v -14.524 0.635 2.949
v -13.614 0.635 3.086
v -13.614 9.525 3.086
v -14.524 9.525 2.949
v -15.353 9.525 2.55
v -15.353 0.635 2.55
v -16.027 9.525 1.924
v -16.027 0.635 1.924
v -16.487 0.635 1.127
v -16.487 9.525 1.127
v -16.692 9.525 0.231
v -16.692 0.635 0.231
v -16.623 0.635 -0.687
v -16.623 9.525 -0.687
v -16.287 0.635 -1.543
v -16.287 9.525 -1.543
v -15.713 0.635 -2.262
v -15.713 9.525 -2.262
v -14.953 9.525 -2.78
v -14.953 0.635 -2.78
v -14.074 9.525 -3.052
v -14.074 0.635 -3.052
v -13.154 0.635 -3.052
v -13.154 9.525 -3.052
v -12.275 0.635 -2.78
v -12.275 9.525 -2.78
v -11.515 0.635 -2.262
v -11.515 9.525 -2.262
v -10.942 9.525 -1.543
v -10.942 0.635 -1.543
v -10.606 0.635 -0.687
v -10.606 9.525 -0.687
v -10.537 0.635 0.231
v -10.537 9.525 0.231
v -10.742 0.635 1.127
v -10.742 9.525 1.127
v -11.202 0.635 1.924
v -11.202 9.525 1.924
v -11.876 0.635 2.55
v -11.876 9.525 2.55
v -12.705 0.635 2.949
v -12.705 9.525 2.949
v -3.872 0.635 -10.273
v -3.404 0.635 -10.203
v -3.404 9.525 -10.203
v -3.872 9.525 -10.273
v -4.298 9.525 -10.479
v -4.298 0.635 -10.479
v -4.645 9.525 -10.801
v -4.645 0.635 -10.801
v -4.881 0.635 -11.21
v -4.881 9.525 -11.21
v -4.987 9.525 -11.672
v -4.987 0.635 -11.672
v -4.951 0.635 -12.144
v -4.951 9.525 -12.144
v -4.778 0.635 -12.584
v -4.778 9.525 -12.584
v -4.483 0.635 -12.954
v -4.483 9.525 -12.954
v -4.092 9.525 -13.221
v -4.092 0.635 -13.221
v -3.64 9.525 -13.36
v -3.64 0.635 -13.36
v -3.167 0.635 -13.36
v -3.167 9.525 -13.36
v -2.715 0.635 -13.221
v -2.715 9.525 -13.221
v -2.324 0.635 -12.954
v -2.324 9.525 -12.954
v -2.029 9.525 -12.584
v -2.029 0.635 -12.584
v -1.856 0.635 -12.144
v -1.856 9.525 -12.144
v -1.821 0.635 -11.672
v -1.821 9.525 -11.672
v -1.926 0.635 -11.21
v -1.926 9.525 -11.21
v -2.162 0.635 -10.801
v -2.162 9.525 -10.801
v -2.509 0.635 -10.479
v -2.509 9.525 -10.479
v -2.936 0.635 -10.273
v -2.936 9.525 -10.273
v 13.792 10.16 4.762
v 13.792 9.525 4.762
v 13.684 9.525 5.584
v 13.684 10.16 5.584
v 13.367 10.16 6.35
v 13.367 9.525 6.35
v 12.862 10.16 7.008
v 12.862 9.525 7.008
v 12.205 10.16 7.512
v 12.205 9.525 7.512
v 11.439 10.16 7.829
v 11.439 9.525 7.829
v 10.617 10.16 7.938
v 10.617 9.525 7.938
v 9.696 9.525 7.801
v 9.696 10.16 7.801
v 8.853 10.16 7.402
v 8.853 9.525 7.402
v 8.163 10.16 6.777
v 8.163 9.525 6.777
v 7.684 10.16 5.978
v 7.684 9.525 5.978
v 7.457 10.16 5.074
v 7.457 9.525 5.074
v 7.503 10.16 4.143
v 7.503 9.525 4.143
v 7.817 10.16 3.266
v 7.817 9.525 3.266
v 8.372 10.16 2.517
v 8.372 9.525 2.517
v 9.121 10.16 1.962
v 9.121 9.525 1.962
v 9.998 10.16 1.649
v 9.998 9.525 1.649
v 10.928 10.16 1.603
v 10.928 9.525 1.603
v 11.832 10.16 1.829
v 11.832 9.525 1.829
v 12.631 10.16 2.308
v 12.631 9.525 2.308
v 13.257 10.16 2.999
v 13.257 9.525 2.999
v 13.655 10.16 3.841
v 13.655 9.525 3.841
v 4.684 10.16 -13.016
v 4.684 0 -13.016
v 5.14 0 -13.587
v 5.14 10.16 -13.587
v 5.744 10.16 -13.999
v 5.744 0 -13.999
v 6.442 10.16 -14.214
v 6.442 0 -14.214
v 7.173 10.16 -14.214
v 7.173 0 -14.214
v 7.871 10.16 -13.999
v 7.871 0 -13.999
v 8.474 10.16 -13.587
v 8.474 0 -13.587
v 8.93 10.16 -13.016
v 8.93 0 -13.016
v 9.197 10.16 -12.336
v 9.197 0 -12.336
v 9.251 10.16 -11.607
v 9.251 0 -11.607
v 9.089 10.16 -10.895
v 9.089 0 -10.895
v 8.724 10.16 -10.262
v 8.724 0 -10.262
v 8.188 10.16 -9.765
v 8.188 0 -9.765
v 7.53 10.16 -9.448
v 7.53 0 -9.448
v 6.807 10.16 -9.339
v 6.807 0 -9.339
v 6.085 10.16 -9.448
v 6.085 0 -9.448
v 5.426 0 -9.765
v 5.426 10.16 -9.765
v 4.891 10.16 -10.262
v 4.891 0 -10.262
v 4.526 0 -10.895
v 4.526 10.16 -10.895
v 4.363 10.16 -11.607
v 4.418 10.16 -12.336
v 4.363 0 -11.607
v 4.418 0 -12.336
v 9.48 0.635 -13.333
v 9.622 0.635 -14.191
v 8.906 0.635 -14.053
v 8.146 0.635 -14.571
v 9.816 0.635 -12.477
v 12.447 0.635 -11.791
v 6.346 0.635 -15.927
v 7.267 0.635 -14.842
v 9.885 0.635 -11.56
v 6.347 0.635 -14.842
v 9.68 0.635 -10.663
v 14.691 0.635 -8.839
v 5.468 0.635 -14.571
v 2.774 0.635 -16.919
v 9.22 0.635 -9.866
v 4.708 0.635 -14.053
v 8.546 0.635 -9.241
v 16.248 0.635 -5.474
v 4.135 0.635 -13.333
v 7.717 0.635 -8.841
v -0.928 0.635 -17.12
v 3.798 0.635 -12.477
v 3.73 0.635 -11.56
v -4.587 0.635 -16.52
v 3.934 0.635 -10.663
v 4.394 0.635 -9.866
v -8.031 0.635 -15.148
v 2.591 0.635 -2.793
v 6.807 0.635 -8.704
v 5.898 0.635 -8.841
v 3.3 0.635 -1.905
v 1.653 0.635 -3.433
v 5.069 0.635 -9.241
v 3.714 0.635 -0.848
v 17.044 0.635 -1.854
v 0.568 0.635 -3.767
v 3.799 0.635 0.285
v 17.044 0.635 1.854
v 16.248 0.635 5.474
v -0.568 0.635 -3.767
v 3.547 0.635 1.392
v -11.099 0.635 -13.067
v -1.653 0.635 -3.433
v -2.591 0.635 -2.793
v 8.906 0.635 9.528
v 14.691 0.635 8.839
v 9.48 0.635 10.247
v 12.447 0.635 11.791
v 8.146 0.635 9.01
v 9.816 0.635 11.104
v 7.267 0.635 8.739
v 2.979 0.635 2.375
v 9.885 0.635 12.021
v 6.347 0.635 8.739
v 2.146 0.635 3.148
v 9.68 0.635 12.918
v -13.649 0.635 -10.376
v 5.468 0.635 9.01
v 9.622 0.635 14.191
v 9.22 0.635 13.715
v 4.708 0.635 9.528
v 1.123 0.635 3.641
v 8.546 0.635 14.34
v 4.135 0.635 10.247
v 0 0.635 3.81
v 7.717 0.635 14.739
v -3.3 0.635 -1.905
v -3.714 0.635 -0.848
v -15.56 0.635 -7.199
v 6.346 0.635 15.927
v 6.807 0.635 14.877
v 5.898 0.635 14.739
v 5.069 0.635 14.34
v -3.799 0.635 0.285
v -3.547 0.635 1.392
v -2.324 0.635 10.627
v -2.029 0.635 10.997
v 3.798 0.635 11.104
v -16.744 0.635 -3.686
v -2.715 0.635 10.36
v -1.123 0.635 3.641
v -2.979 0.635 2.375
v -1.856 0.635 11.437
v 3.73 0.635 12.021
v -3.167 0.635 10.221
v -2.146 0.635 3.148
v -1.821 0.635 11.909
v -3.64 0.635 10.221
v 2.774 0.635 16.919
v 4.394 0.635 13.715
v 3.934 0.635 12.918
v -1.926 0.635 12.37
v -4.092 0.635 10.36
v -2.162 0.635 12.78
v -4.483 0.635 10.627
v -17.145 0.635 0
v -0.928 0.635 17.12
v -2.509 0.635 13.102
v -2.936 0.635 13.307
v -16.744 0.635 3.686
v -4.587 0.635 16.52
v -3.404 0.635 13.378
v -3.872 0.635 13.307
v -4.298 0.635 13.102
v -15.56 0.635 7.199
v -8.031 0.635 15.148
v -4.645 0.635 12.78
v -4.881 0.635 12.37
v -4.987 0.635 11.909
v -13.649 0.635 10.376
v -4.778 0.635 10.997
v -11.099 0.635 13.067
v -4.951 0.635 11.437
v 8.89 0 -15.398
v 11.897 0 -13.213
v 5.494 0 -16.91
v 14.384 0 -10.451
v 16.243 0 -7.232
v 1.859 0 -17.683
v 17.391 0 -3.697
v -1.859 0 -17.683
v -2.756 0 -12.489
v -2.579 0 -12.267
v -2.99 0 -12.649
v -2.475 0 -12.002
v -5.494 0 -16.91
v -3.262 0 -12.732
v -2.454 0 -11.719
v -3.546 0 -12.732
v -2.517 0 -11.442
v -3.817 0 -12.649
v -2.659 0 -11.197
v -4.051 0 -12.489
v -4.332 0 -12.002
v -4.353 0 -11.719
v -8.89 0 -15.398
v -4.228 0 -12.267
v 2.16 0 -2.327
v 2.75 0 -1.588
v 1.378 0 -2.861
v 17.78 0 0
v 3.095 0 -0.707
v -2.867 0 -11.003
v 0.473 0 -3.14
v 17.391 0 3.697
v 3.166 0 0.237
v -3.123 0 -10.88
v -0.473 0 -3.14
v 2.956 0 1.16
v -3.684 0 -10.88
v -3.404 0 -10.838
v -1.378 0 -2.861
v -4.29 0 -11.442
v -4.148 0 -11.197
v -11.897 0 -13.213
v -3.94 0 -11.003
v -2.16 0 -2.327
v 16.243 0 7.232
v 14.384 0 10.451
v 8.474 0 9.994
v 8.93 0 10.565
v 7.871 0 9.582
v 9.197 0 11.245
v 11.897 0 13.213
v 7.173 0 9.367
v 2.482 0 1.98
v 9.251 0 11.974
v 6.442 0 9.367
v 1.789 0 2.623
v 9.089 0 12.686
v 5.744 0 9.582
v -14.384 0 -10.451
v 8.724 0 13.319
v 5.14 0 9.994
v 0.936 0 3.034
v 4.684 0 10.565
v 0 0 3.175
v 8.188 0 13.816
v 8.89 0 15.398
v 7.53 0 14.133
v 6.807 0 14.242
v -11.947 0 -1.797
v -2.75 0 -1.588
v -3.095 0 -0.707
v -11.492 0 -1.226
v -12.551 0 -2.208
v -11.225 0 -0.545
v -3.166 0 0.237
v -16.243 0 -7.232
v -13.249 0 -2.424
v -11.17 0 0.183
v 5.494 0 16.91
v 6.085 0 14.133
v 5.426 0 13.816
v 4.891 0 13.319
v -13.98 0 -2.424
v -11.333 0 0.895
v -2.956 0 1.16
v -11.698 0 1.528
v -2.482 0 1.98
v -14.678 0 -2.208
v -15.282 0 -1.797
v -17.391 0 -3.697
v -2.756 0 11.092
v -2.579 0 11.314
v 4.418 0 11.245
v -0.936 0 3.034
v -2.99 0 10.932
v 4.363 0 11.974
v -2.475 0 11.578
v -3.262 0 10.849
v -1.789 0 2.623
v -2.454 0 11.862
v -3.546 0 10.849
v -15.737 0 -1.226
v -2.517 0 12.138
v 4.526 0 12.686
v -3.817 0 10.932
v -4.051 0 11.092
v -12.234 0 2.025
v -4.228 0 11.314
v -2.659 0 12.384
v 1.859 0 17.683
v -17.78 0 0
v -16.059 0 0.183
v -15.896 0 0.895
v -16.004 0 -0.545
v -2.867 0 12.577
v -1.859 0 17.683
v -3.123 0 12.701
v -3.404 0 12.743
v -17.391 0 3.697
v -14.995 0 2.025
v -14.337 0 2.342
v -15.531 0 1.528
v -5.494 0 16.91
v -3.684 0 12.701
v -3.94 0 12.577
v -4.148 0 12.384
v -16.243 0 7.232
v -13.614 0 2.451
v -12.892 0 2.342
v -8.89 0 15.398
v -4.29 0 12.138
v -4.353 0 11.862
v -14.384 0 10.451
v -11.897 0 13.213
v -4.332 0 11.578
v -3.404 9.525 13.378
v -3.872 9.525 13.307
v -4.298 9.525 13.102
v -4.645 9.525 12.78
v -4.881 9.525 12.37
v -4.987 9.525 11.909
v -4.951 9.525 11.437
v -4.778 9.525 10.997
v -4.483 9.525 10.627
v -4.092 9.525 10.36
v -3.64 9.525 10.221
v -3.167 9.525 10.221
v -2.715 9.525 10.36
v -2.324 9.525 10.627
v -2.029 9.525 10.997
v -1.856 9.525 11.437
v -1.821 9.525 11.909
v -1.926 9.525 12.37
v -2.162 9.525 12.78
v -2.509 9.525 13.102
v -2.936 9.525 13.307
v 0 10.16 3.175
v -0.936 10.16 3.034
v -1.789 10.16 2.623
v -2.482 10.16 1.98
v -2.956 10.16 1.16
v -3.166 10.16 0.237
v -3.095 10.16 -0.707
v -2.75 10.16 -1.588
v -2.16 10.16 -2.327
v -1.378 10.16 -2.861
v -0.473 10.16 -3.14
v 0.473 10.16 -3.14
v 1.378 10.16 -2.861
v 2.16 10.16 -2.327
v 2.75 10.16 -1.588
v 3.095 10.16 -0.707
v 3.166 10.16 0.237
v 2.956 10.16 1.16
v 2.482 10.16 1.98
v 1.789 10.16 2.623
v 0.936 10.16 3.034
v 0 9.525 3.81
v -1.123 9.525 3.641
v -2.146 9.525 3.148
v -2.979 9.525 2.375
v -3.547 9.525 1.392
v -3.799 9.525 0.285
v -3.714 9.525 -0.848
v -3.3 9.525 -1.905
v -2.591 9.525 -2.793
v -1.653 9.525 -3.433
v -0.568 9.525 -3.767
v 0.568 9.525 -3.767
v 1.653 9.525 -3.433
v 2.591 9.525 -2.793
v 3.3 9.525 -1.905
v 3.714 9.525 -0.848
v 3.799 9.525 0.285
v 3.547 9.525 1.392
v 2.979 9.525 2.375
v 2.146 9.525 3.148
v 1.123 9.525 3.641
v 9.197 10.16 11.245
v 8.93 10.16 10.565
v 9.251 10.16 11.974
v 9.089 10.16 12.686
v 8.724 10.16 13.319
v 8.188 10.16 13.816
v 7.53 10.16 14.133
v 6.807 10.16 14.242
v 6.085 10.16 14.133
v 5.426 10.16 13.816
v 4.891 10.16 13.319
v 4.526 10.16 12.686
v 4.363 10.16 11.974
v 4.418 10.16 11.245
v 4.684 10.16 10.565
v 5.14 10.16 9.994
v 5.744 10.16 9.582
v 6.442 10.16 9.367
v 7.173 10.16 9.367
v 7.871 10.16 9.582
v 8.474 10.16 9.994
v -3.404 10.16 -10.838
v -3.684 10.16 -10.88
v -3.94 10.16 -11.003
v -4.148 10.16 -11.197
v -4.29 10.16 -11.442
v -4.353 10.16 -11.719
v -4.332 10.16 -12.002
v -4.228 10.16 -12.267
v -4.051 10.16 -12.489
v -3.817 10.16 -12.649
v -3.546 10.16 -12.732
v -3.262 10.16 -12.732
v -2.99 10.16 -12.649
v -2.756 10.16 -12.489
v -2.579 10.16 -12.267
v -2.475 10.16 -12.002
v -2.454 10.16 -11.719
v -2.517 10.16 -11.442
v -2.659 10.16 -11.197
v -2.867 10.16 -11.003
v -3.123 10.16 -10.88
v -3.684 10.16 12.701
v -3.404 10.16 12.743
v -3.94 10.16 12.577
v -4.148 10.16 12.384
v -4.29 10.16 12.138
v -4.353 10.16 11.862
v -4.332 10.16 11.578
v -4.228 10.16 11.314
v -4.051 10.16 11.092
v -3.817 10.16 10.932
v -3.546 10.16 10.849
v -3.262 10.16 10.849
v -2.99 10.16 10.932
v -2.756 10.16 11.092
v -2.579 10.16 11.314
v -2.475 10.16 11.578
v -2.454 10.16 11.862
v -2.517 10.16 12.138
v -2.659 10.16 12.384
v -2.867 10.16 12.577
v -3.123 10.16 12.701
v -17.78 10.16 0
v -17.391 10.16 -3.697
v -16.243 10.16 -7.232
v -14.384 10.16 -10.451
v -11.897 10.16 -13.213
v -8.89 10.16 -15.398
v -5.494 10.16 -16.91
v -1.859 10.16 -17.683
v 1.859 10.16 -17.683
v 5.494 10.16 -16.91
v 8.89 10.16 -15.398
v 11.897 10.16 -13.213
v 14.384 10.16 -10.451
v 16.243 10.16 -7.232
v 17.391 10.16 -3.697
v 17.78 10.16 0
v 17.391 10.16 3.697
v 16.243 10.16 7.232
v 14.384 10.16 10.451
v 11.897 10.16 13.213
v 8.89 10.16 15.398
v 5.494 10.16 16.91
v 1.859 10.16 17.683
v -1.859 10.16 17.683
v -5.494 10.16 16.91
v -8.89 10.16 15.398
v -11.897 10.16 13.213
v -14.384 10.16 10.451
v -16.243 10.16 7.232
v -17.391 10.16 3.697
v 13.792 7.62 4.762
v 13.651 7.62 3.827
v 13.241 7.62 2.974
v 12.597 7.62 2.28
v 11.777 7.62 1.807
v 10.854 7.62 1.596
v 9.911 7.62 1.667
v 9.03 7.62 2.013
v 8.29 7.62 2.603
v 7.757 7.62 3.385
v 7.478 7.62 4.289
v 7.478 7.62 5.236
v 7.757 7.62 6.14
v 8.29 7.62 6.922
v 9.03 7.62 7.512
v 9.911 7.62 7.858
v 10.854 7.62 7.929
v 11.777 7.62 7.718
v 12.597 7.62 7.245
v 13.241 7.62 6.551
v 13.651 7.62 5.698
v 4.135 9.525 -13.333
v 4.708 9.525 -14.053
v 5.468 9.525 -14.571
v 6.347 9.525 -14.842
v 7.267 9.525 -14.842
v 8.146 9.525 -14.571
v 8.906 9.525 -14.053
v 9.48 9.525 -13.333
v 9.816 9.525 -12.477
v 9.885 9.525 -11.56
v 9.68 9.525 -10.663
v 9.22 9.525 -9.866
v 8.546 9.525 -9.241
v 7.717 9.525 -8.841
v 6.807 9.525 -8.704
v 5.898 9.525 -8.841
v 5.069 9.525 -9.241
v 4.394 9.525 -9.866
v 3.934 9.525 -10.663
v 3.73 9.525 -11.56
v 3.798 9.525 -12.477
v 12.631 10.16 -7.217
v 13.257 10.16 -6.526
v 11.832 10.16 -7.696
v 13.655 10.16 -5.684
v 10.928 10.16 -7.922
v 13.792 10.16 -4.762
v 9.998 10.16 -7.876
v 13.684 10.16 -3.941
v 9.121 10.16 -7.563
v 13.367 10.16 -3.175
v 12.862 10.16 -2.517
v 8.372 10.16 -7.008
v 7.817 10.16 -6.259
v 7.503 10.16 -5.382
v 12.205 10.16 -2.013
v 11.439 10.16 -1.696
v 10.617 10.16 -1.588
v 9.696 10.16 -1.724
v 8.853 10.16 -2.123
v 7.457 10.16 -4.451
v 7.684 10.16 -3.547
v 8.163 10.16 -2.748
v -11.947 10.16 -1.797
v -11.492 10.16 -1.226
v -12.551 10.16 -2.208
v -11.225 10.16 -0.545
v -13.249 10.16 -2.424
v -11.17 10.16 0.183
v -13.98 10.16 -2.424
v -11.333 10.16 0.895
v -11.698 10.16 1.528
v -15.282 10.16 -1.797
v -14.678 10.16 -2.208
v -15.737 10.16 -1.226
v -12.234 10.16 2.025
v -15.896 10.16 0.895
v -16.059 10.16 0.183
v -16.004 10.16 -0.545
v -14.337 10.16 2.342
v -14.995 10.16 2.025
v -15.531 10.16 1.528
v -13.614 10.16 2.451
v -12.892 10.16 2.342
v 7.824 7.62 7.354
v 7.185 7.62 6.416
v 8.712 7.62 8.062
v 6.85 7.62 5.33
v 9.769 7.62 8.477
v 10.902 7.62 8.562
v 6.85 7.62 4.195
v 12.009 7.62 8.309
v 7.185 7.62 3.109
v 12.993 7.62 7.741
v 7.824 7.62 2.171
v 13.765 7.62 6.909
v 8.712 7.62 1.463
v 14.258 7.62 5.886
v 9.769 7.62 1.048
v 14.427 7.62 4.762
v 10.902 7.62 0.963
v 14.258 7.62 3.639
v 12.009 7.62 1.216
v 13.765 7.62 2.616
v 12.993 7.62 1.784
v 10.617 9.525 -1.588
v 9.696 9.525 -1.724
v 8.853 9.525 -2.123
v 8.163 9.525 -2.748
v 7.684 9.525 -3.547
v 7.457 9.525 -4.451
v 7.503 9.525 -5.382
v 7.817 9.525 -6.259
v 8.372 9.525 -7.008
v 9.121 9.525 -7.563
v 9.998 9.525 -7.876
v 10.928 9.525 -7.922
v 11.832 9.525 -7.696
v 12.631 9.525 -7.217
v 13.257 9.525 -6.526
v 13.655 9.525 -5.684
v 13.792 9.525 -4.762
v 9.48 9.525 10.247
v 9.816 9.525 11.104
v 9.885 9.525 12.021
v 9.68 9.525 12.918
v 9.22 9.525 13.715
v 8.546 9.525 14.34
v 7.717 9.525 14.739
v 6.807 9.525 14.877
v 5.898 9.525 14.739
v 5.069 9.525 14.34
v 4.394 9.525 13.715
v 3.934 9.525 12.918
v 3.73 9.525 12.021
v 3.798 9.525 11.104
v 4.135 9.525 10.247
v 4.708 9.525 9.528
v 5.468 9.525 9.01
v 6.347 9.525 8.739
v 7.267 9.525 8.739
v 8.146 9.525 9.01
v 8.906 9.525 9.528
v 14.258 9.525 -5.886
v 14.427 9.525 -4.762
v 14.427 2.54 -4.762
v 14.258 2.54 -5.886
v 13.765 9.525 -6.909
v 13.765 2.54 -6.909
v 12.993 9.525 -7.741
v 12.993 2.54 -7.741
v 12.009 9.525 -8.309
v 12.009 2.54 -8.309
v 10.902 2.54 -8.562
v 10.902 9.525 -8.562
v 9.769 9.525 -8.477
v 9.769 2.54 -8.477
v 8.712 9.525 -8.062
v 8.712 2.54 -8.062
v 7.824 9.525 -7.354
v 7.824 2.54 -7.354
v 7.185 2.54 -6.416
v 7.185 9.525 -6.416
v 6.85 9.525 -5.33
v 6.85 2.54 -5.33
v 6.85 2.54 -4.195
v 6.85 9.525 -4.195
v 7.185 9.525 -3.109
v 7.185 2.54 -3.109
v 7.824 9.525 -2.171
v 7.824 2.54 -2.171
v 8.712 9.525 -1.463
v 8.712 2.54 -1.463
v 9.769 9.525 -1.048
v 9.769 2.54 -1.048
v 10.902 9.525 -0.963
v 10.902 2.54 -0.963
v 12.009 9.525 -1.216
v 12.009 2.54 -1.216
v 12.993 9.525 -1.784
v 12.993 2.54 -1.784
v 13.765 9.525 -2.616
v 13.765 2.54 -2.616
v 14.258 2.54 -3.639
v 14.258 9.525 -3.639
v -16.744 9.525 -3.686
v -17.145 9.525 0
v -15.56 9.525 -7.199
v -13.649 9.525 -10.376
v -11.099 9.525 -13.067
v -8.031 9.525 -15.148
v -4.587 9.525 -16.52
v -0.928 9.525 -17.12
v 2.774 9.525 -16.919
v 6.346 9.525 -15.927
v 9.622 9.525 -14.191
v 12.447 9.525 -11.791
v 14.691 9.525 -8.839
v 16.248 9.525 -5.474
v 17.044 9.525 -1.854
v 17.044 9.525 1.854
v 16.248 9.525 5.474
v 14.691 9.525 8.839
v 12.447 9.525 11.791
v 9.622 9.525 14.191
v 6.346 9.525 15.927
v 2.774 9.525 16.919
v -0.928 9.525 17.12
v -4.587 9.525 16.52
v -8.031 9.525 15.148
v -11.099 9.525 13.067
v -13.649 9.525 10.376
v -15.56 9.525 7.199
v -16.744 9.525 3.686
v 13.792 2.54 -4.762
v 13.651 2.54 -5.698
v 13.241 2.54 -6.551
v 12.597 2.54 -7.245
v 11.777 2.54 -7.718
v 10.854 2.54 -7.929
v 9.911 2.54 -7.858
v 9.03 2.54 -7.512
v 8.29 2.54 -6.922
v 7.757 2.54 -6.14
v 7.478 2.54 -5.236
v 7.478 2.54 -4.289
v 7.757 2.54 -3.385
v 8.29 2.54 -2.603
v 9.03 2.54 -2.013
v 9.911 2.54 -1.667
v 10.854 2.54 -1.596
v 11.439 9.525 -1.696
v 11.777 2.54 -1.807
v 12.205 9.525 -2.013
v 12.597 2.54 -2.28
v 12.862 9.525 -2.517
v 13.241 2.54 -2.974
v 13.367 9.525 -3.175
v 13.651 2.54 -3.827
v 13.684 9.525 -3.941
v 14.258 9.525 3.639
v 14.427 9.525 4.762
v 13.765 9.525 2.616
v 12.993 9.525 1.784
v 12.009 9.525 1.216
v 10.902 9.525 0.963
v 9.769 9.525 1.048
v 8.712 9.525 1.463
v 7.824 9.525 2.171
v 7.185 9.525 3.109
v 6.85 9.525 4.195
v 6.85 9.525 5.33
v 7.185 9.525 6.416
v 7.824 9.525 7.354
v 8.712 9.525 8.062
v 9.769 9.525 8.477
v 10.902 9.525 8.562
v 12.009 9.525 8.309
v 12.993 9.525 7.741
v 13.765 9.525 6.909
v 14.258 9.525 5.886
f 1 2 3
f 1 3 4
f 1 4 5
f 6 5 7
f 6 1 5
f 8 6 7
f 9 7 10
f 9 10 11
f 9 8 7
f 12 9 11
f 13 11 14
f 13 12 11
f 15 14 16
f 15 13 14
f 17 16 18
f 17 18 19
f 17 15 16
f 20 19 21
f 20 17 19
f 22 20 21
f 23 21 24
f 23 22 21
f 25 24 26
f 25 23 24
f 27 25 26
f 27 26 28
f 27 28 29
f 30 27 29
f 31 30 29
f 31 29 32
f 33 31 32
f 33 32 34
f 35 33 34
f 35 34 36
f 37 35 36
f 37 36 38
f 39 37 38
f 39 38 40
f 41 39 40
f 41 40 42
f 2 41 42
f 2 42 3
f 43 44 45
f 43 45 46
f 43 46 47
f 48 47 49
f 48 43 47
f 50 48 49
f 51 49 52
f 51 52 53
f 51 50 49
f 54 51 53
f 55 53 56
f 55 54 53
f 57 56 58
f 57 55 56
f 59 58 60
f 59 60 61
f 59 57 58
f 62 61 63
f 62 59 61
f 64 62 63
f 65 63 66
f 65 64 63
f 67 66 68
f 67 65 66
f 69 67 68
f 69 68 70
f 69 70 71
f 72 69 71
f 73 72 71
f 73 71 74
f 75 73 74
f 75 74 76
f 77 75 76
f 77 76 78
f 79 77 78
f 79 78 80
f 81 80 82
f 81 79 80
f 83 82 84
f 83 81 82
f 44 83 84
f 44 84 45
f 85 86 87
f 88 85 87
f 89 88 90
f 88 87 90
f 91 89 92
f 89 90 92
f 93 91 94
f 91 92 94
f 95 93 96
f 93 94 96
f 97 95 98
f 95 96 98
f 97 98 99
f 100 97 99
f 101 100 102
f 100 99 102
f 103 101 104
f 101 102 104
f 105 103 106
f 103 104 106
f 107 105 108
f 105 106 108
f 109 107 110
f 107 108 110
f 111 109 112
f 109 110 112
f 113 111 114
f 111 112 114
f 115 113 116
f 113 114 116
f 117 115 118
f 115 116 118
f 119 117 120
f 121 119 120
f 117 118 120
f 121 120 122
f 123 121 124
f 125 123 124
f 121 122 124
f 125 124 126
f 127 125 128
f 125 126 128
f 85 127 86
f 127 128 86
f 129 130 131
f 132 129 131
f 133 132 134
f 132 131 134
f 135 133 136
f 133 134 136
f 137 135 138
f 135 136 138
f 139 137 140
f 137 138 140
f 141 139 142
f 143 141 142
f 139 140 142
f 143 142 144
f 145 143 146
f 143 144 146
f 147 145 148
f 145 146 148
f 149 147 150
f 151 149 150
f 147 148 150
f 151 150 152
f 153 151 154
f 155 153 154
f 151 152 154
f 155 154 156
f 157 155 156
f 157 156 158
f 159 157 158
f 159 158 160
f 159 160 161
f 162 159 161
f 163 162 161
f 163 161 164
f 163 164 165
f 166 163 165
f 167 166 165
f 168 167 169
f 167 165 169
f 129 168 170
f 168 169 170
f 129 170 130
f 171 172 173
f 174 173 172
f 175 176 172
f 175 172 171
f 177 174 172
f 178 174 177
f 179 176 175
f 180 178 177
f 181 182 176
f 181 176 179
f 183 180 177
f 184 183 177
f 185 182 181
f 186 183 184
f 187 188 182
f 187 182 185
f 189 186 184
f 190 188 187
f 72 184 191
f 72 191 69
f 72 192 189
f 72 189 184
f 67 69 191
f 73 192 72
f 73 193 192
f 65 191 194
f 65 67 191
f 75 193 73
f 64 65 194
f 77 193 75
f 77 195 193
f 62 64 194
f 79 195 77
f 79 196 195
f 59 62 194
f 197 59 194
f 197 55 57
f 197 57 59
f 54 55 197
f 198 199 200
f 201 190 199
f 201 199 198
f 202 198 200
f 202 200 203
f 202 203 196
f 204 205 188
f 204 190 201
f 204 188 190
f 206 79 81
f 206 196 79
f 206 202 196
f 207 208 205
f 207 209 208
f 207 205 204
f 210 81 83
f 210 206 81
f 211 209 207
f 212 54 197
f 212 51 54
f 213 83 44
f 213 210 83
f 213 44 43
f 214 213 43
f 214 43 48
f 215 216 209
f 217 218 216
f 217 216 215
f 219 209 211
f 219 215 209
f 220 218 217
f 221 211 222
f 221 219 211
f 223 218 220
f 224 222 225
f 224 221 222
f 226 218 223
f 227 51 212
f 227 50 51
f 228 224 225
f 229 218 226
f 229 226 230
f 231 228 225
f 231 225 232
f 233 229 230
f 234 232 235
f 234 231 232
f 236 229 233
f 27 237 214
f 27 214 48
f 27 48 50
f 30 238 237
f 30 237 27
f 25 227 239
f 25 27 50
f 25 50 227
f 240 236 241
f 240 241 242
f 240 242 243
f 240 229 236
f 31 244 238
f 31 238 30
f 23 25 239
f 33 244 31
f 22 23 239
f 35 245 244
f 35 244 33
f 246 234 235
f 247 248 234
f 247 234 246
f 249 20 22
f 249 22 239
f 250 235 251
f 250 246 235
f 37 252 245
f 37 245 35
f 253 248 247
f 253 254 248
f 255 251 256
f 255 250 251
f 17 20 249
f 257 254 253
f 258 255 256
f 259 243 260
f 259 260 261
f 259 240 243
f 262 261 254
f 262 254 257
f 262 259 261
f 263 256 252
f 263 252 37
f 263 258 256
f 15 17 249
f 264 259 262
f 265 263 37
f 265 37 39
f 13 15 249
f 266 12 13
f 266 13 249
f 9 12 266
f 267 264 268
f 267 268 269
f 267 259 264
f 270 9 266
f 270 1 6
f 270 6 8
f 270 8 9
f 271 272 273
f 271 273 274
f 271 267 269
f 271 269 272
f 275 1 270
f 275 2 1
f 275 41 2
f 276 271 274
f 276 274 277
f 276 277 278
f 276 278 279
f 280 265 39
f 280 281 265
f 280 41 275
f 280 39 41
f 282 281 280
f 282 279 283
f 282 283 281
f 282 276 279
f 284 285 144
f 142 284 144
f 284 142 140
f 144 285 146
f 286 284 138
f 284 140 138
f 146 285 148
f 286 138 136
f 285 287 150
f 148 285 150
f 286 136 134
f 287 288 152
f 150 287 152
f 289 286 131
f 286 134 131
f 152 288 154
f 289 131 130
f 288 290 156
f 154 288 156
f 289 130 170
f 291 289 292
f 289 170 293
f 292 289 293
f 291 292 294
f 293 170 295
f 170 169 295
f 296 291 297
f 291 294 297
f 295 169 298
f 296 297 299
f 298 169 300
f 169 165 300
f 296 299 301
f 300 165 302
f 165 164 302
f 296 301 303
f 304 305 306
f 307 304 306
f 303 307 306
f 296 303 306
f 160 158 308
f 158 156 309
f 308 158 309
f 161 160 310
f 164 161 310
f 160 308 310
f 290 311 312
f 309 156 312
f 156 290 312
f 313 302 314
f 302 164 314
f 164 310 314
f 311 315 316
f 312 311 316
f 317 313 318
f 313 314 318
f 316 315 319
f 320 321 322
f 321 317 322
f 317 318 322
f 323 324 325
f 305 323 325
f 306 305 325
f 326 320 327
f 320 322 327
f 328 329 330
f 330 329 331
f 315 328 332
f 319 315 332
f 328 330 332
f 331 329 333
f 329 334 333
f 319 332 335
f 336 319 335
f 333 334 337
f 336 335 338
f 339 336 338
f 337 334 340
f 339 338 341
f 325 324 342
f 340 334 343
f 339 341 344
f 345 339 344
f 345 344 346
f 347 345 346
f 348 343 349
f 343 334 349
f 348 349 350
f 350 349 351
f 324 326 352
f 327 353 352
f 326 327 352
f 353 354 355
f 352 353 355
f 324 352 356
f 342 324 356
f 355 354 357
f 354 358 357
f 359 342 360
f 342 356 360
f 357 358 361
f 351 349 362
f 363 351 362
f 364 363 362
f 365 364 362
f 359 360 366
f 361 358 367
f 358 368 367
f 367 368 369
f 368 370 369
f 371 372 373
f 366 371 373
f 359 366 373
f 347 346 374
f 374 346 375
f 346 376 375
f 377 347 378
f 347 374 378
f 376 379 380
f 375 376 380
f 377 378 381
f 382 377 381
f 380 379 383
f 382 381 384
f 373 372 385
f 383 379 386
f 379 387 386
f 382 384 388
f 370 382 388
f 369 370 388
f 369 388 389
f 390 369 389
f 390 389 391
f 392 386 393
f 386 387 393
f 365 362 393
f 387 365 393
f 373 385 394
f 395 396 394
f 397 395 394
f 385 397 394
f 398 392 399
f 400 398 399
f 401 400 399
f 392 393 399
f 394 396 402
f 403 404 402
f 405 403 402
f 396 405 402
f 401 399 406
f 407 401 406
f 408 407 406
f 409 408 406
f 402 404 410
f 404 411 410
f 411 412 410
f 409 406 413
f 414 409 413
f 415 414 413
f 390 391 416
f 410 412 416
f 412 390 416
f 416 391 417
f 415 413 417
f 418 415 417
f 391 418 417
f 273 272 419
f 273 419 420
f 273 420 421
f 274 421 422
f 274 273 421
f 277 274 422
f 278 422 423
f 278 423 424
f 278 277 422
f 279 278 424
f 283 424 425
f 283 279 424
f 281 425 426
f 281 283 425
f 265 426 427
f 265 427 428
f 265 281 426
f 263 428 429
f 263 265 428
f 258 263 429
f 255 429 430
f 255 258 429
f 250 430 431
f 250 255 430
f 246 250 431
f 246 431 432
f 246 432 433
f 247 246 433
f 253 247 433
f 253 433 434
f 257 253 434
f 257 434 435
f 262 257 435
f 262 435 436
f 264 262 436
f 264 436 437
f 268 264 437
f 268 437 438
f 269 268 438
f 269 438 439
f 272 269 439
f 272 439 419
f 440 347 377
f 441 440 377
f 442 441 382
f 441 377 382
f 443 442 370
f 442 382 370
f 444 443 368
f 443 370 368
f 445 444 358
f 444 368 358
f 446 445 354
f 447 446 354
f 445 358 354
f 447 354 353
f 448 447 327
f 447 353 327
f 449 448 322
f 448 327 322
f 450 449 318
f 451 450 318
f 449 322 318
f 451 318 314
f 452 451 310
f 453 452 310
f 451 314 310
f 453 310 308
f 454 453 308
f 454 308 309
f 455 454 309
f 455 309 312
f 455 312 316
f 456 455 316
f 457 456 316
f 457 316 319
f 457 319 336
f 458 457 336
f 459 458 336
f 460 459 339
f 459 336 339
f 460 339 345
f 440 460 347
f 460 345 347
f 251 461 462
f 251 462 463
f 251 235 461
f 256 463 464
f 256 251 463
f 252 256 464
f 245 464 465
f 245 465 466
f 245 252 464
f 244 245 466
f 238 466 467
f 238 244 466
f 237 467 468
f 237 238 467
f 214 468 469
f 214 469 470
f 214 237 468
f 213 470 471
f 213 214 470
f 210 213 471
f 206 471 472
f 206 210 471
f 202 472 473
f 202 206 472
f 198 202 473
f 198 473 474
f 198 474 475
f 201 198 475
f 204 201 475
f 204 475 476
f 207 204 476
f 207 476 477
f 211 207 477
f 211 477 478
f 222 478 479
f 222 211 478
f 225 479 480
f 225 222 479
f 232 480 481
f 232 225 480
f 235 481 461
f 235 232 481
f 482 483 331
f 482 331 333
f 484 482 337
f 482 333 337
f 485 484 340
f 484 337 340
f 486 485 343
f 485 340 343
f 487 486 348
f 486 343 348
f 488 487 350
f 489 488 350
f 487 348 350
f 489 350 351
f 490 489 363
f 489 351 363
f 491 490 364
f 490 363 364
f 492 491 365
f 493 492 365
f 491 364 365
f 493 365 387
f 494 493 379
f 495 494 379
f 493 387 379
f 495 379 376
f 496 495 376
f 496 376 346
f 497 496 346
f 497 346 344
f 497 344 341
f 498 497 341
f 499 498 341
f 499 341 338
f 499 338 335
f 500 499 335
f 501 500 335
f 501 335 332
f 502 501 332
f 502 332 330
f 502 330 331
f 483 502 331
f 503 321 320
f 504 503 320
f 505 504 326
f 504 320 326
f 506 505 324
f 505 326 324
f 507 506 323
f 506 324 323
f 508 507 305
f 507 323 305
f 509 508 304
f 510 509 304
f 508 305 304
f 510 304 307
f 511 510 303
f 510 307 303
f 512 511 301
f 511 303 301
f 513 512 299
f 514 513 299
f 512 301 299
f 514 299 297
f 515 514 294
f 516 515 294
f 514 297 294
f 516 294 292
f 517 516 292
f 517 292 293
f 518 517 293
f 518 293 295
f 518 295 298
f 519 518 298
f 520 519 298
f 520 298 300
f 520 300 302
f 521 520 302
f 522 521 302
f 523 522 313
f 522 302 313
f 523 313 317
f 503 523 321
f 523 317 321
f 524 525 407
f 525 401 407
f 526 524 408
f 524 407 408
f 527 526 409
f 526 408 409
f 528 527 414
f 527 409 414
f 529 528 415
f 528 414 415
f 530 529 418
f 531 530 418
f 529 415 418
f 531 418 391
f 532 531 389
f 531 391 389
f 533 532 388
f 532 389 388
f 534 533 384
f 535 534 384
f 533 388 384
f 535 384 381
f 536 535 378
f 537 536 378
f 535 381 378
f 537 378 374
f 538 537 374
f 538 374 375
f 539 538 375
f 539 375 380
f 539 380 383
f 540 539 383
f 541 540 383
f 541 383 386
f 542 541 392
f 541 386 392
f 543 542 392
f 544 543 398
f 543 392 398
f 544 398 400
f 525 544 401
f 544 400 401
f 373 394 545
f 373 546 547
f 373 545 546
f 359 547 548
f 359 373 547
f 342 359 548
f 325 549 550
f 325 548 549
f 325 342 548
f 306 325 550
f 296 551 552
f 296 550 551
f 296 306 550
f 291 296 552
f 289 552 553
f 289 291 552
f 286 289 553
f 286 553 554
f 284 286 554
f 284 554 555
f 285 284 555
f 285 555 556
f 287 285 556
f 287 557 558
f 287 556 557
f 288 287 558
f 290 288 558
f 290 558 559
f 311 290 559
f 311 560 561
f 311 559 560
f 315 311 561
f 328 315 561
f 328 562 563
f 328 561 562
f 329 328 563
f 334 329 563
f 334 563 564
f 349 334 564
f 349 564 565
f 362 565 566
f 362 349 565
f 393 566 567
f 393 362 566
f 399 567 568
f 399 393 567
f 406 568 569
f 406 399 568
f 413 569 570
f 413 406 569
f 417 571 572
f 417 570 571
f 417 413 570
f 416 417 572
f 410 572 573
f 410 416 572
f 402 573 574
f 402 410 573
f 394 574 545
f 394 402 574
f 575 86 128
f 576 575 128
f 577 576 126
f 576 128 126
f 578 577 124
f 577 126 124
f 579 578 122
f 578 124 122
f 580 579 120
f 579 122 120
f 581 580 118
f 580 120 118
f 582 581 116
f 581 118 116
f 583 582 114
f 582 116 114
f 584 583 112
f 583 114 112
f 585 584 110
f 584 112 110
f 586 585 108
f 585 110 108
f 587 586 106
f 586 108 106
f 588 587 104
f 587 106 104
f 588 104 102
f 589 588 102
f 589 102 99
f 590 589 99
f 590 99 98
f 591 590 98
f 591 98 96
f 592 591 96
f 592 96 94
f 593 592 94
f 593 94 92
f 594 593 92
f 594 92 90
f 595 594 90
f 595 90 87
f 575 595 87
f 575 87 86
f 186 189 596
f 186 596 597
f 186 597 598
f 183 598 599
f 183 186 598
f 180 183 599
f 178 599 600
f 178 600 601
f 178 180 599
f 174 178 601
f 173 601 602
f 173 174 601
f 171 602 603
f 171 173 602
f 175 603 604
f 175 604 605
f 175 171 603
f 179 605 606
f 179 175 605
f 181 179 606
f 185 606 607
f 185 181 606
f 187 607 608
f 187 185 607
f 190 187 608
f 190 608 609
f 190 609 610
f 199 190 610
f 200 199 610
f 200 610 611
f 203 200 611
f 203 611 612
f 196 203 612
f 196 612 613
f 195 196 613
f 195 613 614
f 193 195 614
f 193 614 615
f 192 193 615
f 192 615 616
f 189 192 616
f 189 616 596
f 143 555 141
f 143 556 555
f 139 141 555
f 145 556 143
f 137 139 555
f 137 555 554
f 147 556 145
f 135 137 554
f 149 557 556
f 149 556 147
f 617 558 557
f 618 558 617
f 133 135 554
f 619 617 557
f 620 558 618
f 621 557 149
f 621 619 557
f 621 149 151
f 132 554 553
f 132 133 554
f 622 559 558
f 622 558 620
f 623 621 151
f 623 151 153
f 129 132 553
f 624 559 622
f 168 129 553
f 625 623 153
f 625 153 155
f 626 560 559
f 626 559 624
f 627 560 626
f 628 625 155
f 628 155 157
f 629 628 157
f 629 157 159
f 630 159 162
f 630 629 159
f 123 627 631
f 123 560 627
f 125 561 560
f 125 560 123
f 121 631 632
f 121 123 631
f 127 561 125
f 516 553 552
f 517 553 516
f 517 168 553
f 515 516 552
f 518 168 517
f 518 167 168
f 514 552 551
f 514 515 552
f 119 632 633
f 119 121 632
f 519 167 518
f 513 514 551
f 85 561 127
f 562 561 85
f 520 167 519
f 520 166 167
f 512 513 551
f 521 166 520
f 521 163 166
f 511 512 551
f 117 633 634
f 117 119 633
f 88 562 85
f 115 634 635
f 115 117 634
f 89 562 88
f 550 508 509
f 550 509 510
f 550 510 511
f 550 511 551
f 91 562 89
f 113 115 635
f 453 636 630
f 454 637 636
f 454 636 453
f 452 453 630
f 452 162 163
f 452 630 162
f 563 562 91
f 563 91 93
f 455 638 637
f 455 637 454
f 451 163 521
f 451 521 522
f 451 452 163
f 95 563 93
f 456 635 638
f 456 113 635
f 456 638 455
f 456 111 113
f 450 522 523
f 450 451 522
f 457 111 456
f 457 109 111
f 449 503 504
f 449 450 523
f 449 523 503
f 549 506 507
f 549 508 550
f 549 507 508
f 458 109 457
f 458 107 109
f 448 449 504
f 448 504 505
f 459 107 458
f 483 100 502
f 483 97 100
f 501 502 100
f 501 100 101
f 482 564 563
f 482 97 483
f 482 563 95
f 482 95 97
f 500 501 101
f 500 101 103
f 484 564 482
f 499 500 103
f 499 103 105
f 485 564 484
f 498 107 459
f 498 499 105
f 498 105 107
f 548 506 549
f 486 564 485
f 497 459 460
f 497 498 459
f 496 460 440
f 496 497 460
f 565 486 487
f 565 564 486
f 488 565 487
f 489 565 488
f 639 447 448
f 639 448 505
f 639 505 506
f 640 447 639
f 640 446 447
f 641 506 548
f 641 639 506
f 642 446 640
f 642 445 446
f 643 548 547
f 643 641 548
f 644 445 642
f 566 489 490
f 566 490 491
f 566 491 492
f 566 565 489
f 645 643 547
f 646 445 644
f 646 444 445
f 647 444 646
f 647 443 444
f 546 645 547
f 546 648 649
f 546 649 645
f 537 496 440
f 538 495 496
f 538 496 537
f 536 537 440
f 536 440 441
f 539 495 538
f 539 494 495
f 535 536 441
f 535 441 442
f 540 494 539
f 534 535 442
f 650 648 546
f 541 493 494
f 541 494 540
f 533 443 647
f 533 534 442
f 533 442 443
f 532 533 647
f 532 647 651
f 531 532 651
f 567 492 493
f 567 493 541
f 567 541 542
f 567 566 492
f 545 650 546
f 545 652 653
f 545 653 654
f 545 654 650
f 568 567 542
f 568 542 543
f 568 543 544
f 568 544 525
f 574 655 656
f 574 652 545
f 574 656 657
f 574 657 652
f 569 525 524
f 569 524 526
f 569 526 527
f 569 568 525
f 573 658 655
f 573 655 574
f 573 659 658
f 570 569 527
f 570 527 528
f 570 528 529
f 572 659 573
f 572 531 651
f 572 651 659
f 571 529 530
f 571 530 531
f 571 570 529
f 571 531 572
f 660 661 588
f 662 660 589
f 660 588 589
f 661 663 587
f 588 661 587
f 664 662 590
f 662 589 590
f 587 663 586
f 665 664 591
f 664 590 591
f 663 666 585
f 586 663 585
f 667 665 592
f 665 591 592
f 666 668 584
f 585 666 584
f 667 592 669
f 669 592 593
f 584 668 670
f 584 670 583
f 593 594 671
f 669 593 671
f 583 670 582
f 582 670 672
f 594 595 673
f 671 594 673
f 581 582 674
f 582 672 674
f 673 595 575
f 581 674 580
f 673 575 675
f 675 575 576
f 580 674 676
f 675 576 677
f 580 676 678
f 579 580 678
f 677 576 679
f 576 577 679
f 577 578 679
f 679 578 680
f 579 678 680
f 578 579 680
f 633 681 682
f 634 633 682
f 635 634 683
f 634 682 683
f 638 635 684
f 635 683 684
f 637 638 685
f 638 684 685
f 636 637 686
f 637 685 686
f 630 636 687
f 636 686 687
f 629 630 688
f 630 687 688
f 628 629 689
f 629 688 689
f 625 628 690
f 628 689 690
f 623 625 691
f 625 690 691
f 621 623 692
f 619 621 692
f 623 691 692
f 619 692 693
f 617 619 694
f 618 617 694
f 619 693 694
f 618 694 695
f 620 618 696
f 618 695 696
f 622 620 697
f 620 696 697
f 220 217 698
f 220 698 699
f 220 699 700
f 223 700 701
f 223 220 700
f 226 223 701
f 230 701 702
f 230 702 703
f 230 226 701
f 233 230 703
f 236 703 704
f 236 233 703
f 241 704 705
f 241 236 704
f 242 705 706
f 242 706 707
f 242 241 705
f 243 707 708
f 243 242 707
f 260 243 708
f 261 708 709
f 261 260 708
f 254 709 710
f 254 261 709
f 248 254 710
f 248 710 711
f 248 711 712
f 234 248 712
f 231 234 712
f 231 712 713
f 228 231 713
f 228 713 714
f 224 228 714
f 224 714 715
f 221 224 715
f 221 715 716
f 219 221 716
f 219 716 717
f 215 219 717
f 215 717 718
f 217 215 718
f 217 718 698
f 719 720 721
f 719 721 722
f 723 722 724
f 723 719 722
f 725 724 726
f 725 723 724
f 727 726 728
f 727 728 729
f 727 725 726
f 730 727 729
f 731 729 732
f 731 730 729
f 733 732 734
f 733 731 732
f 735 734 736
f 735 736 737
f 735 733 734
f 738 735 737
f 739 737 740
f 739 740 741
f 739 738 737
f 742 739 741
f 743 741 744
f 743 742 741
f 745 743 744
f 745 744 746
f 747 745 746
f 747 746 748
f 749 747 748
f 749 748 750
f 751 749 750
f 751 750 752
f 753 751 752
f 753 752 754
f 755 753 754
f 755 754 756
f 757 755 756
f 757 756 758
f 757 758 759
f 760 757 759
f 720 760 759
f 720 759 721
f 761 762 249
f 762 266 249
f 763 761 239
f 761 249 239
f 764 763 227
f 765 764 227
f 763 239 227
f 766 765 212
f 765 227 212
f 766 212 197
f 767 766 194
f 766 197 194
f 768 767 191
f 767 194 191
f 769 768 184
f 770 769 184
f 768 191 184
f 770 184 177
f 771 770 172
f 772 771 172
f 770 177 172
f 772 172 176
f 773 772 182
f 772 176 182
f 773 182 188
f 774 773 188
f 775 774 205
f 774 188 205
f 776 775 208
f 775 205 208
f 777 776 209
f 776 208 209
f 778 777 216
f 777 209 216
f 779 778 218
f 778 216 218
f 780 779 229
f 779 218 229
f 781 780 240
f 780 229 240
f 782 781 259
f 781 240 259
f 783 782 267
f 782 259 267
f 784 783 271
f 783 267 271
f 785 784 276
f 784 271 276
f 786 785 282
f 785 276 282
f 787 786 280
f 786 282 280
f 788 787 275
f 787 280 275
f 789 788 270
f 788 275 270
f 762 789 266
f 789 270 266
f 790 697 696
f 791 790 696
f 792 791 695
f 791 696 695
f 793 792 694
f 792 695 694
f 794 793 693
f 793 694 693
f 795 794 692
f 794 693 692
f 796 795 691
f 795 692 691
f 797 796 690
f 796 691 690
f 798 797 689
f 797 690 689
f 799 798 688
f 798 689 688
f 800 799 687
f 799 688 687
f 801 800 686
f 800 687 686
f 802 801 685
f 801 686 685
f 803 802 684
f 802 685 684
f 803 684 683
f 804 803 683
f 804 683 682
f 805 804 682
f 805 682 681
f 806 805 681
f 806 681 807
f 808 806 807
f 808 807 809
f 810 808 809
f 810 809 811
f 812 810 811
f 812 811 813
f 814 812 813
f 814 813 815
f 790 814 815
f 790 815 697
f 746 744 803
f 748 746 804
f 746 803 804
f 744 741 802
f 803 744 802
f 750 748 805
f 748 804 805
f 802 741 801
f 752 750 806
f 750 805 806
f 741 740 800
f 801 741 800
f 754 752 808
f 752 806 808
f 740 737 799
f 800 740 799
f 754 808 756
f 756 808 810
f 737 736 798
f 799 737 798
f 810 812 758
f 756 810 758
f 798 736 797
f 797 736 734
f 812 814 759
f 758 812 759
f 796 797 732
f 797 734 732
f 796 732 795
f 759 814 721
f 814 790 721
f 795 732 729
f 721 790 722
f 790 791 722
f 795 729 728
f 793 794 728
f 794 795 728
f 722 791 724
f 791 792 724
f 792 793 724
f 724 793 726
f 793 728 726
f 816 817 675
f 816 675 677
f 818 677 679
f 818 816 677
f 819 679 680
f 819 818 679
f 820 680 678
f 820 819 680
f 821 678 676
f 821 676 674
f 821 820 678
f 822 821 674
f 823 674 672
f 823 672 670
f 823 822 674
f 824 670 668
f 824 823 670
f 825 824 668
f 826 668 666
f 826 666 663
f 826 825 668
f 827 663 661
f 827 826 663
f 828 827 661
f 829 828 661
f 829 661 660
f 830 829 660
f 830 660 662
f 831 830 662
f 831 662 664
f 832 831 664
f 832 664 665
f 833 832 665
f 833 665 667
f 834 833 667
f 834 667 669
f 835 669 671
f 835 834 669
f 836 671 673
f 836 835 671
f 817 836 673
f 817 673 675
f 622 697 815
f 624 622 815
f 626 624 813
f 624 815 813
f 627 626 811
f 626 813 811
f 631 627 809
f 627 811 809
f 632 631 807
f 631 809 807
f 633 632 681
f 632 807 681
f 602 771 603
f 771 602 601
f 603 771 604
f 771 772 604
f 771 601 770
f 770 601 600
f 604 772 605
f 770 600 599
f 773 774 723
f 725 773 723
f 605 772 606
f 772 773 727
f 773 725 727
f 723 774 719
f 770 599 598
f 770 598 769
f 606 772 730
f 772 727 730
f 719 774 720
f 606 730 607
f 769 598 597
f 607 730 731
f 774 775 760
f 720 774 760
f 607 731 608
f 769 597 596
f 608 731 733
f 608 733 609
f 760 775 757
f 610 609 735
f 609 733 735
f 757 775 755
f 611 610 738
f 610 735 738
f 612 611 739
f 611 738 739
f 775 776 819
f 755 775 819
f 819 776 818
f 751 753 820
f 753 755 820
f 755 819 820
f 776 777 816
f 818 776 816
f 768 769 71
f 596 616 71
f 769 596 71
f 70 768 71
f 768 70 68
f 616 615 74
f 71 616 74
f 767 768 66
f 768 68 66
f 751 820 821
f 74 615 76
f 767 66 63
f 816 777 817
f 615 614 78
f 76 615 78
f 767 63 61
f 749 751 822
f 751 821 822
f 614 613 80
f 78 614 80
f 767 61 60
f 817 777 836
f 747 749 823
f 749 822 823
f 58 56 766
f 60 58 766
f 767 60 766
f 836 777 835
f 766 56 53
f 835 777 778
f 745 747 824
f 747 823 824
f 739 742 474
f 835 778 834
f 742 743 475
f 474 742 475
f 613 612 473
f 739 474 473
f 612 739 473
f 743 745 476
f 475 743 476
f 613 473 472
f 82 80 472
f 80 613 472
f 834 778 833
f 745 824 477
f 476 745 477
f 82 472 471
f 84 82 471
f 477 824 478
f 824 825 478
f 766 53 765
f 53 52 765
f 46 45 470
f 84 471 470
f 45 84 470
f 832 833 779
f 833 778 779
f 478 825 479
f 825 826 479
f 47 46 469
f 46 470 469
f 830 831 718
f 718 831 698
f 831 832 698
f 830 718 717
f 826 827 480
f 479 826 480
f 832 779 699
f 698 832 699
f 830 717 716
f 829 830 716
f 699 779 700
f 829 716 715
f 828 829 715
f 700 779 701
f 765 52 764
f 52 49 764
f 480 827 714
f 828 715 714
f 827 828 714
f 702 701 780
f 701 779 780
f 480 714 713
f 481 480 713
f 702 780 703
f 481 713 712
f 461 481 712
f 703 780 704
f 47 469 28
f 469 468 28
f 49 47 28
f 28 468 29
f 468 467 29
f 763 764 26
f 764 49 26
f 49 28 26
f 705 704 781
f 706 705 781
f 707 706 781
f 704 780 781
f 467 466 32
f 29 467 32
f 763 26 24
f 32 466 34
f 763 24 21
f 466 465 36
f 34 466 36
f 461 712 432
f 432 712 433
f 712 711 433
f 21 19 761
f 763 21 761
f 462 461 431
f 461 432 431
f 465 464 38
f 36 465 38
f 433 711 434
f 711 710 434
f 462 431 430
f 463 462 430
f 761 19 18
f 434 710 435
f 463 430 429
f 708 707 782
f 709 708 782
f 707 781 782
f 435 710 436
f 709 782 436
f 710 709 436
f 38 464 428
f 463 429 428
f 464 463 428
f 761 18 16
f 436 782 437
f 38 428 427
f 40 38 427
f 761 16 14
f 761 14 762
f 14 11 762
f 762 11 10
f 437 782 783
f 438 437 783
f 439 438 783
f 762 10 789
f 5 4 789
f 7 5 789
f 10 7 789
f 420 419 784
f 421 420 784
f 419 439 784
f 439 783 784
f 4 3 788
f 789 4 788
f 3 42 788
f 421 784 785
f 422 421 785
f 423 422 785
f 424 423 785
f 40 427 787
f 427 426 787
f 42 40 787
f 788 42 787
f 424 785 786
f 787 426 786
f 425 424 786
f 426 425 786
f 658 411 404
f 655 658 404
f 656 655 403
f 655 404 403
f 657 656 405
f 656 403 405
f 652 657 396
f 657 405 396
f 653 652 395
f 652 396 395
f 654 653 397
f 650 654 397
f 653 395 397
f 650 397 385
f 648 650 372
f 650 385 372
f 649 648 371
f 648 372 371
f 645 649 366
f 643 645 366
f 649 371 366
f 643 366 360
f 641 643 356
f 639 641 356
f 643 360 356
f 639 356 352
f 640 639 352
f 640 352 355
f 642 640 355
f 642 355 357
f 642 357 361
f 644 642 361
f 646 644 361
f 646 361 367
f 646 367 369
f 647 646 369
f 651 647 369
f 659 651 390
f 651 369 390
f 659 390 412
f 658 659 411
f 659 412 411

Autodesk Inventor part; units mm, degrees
ref_plane "YZ Plane" through (0, 0, 0) normal (1, 0, 0) x (0, 1, 0)
ref_plane "XZ Plane" through (0, 0, 0) normal (0, 1, 0) x (-1, 0, 0)
ref_plane "XY Plane" through (0, 0, 0) normal (0, 0, 1) x (1, 0, 0)
sketch "Sketch1" plane through (0, 0, 0) normal (0, 1, 0) x (-1, 0, 0)
  circle A0 centre (0, 0) radius 17.78
  dimension "d0" = 35.56
extrude "Extrusion1" add sketch "Sketch1" along normal blind 10.16
sketch "Sketch2" plane through (0, 10.16, 0) normal (0, 1, 0) x (1, 0, 0)
  circle A0 centre (0, 0) radius 17.78 projected
hole "Hole1" at (0, 10.16, 0) direction (0, -1, 0) diameter 6.35 end through all
sketch "Sketch3" plane through (0, 10.16, 0) normal (0, 1, 0) x (1, 0, 0)
  line L0 (0, 0) -> (-13.6144, 0)
  dimension "d10" = 13.6144
hole "Hole2" at (-13.6144, 10.16, 0) direction (0, -1, 0) diameter 4.9022 end through all
pattern_circular "Circular Pattern1" count 3 over 360 about axis through (0, -41.1455, 0) along (0, 1, 0) of "Hole2"
sketch "Sketch5" plane through (0, 10.16, 0) normal (0, 1, 0) x (1, 0, 0)
  circle A0 centre (-13.6144, 0) radius 2.4511 projected
  circle A1 centre (6.8072, 11.7904) radius 2.4511 projected
  line L0 (-13.6144, 0) -> (6.8072, 11.7904)
  circle A2 centre (6.8072, -11.7904) radius 2.4511 projected
  line L1 (6.8072, 11.7904) -> (6.8072, -11.7904)
  line L2 (6.8072, -11.7904) -> (-13.6144, 0)
  line L3 (-13.6144, 0) -> (-13.6144, -11.7904)
  line L4 (-13.6144, -11.7904) -> (6.8072, -11.7904)
  line L5 (-13.6144, 0) -> (-13.6144, 11.7904)
  line L6 (-13.6144, 11.7904) -> (6.8072, 11.7904)
  circle A3 centre (-3.4036, 11.7904) radius 0.635
  circle A4 centre (-3.4036, -11.7904) radius 0.635
  point P0 (0, 0)
  dimension "d28" = 1.27
hole "Hole4" at (-3.4036, 10.16, 11.7904) at (-3.4036, 10.16, -11.7904) direction (0, -1, 0) diameter 1.905 end through all
sketch "Sketch15" plane through (0, 10.16, 0) normal (0, 1, 0) x (1, 0, 0)
  circle A0 centre (10.6172, -4.7625) radius 3.175 projected
  circle A1 centre (10.6172, 4.7625) radius 3.175 projected
  point P0 (0, 0)
shell "Shell3" thickness 0.635 removed faces 0
hole "Hole7" at (10.6172, 10.16, 4.7625) at (10.6172, 10.16, -4.7625) direction (0, -1, 0) diameter 6.35 depth 5.08
sketch "Sketch16" plane through (0, 10.16, 0) normal (0, 1, 0) x (1, 0, 0)
  circle A0 centre (10.6172, 4.7625) radius 3.175 projected
  circle A1 centre (10.6172, 4.7625) radius 3.81
  circle A2 centre (10.6172, -4.7625) radius 3.175 projected
  circle A3 centre (10.6172, -4.7625) radius 3.81
  circle A4 centre (10.6172, 4.7625) radius 3.175
  circle A5 centre (10.6172, -4.7625) radius 3.175
  point P0 (0, 0)
  dimension "d85" = 7.62
  dimension "d86" = 7.62
extrude "Extrusion7" add sketch "Sketch16" against normal blind 2.54 contours A3
extrude "Extrusion8" add sketch "Sketch16" against normal blind 7.62 contours A1
properties part number "water"
